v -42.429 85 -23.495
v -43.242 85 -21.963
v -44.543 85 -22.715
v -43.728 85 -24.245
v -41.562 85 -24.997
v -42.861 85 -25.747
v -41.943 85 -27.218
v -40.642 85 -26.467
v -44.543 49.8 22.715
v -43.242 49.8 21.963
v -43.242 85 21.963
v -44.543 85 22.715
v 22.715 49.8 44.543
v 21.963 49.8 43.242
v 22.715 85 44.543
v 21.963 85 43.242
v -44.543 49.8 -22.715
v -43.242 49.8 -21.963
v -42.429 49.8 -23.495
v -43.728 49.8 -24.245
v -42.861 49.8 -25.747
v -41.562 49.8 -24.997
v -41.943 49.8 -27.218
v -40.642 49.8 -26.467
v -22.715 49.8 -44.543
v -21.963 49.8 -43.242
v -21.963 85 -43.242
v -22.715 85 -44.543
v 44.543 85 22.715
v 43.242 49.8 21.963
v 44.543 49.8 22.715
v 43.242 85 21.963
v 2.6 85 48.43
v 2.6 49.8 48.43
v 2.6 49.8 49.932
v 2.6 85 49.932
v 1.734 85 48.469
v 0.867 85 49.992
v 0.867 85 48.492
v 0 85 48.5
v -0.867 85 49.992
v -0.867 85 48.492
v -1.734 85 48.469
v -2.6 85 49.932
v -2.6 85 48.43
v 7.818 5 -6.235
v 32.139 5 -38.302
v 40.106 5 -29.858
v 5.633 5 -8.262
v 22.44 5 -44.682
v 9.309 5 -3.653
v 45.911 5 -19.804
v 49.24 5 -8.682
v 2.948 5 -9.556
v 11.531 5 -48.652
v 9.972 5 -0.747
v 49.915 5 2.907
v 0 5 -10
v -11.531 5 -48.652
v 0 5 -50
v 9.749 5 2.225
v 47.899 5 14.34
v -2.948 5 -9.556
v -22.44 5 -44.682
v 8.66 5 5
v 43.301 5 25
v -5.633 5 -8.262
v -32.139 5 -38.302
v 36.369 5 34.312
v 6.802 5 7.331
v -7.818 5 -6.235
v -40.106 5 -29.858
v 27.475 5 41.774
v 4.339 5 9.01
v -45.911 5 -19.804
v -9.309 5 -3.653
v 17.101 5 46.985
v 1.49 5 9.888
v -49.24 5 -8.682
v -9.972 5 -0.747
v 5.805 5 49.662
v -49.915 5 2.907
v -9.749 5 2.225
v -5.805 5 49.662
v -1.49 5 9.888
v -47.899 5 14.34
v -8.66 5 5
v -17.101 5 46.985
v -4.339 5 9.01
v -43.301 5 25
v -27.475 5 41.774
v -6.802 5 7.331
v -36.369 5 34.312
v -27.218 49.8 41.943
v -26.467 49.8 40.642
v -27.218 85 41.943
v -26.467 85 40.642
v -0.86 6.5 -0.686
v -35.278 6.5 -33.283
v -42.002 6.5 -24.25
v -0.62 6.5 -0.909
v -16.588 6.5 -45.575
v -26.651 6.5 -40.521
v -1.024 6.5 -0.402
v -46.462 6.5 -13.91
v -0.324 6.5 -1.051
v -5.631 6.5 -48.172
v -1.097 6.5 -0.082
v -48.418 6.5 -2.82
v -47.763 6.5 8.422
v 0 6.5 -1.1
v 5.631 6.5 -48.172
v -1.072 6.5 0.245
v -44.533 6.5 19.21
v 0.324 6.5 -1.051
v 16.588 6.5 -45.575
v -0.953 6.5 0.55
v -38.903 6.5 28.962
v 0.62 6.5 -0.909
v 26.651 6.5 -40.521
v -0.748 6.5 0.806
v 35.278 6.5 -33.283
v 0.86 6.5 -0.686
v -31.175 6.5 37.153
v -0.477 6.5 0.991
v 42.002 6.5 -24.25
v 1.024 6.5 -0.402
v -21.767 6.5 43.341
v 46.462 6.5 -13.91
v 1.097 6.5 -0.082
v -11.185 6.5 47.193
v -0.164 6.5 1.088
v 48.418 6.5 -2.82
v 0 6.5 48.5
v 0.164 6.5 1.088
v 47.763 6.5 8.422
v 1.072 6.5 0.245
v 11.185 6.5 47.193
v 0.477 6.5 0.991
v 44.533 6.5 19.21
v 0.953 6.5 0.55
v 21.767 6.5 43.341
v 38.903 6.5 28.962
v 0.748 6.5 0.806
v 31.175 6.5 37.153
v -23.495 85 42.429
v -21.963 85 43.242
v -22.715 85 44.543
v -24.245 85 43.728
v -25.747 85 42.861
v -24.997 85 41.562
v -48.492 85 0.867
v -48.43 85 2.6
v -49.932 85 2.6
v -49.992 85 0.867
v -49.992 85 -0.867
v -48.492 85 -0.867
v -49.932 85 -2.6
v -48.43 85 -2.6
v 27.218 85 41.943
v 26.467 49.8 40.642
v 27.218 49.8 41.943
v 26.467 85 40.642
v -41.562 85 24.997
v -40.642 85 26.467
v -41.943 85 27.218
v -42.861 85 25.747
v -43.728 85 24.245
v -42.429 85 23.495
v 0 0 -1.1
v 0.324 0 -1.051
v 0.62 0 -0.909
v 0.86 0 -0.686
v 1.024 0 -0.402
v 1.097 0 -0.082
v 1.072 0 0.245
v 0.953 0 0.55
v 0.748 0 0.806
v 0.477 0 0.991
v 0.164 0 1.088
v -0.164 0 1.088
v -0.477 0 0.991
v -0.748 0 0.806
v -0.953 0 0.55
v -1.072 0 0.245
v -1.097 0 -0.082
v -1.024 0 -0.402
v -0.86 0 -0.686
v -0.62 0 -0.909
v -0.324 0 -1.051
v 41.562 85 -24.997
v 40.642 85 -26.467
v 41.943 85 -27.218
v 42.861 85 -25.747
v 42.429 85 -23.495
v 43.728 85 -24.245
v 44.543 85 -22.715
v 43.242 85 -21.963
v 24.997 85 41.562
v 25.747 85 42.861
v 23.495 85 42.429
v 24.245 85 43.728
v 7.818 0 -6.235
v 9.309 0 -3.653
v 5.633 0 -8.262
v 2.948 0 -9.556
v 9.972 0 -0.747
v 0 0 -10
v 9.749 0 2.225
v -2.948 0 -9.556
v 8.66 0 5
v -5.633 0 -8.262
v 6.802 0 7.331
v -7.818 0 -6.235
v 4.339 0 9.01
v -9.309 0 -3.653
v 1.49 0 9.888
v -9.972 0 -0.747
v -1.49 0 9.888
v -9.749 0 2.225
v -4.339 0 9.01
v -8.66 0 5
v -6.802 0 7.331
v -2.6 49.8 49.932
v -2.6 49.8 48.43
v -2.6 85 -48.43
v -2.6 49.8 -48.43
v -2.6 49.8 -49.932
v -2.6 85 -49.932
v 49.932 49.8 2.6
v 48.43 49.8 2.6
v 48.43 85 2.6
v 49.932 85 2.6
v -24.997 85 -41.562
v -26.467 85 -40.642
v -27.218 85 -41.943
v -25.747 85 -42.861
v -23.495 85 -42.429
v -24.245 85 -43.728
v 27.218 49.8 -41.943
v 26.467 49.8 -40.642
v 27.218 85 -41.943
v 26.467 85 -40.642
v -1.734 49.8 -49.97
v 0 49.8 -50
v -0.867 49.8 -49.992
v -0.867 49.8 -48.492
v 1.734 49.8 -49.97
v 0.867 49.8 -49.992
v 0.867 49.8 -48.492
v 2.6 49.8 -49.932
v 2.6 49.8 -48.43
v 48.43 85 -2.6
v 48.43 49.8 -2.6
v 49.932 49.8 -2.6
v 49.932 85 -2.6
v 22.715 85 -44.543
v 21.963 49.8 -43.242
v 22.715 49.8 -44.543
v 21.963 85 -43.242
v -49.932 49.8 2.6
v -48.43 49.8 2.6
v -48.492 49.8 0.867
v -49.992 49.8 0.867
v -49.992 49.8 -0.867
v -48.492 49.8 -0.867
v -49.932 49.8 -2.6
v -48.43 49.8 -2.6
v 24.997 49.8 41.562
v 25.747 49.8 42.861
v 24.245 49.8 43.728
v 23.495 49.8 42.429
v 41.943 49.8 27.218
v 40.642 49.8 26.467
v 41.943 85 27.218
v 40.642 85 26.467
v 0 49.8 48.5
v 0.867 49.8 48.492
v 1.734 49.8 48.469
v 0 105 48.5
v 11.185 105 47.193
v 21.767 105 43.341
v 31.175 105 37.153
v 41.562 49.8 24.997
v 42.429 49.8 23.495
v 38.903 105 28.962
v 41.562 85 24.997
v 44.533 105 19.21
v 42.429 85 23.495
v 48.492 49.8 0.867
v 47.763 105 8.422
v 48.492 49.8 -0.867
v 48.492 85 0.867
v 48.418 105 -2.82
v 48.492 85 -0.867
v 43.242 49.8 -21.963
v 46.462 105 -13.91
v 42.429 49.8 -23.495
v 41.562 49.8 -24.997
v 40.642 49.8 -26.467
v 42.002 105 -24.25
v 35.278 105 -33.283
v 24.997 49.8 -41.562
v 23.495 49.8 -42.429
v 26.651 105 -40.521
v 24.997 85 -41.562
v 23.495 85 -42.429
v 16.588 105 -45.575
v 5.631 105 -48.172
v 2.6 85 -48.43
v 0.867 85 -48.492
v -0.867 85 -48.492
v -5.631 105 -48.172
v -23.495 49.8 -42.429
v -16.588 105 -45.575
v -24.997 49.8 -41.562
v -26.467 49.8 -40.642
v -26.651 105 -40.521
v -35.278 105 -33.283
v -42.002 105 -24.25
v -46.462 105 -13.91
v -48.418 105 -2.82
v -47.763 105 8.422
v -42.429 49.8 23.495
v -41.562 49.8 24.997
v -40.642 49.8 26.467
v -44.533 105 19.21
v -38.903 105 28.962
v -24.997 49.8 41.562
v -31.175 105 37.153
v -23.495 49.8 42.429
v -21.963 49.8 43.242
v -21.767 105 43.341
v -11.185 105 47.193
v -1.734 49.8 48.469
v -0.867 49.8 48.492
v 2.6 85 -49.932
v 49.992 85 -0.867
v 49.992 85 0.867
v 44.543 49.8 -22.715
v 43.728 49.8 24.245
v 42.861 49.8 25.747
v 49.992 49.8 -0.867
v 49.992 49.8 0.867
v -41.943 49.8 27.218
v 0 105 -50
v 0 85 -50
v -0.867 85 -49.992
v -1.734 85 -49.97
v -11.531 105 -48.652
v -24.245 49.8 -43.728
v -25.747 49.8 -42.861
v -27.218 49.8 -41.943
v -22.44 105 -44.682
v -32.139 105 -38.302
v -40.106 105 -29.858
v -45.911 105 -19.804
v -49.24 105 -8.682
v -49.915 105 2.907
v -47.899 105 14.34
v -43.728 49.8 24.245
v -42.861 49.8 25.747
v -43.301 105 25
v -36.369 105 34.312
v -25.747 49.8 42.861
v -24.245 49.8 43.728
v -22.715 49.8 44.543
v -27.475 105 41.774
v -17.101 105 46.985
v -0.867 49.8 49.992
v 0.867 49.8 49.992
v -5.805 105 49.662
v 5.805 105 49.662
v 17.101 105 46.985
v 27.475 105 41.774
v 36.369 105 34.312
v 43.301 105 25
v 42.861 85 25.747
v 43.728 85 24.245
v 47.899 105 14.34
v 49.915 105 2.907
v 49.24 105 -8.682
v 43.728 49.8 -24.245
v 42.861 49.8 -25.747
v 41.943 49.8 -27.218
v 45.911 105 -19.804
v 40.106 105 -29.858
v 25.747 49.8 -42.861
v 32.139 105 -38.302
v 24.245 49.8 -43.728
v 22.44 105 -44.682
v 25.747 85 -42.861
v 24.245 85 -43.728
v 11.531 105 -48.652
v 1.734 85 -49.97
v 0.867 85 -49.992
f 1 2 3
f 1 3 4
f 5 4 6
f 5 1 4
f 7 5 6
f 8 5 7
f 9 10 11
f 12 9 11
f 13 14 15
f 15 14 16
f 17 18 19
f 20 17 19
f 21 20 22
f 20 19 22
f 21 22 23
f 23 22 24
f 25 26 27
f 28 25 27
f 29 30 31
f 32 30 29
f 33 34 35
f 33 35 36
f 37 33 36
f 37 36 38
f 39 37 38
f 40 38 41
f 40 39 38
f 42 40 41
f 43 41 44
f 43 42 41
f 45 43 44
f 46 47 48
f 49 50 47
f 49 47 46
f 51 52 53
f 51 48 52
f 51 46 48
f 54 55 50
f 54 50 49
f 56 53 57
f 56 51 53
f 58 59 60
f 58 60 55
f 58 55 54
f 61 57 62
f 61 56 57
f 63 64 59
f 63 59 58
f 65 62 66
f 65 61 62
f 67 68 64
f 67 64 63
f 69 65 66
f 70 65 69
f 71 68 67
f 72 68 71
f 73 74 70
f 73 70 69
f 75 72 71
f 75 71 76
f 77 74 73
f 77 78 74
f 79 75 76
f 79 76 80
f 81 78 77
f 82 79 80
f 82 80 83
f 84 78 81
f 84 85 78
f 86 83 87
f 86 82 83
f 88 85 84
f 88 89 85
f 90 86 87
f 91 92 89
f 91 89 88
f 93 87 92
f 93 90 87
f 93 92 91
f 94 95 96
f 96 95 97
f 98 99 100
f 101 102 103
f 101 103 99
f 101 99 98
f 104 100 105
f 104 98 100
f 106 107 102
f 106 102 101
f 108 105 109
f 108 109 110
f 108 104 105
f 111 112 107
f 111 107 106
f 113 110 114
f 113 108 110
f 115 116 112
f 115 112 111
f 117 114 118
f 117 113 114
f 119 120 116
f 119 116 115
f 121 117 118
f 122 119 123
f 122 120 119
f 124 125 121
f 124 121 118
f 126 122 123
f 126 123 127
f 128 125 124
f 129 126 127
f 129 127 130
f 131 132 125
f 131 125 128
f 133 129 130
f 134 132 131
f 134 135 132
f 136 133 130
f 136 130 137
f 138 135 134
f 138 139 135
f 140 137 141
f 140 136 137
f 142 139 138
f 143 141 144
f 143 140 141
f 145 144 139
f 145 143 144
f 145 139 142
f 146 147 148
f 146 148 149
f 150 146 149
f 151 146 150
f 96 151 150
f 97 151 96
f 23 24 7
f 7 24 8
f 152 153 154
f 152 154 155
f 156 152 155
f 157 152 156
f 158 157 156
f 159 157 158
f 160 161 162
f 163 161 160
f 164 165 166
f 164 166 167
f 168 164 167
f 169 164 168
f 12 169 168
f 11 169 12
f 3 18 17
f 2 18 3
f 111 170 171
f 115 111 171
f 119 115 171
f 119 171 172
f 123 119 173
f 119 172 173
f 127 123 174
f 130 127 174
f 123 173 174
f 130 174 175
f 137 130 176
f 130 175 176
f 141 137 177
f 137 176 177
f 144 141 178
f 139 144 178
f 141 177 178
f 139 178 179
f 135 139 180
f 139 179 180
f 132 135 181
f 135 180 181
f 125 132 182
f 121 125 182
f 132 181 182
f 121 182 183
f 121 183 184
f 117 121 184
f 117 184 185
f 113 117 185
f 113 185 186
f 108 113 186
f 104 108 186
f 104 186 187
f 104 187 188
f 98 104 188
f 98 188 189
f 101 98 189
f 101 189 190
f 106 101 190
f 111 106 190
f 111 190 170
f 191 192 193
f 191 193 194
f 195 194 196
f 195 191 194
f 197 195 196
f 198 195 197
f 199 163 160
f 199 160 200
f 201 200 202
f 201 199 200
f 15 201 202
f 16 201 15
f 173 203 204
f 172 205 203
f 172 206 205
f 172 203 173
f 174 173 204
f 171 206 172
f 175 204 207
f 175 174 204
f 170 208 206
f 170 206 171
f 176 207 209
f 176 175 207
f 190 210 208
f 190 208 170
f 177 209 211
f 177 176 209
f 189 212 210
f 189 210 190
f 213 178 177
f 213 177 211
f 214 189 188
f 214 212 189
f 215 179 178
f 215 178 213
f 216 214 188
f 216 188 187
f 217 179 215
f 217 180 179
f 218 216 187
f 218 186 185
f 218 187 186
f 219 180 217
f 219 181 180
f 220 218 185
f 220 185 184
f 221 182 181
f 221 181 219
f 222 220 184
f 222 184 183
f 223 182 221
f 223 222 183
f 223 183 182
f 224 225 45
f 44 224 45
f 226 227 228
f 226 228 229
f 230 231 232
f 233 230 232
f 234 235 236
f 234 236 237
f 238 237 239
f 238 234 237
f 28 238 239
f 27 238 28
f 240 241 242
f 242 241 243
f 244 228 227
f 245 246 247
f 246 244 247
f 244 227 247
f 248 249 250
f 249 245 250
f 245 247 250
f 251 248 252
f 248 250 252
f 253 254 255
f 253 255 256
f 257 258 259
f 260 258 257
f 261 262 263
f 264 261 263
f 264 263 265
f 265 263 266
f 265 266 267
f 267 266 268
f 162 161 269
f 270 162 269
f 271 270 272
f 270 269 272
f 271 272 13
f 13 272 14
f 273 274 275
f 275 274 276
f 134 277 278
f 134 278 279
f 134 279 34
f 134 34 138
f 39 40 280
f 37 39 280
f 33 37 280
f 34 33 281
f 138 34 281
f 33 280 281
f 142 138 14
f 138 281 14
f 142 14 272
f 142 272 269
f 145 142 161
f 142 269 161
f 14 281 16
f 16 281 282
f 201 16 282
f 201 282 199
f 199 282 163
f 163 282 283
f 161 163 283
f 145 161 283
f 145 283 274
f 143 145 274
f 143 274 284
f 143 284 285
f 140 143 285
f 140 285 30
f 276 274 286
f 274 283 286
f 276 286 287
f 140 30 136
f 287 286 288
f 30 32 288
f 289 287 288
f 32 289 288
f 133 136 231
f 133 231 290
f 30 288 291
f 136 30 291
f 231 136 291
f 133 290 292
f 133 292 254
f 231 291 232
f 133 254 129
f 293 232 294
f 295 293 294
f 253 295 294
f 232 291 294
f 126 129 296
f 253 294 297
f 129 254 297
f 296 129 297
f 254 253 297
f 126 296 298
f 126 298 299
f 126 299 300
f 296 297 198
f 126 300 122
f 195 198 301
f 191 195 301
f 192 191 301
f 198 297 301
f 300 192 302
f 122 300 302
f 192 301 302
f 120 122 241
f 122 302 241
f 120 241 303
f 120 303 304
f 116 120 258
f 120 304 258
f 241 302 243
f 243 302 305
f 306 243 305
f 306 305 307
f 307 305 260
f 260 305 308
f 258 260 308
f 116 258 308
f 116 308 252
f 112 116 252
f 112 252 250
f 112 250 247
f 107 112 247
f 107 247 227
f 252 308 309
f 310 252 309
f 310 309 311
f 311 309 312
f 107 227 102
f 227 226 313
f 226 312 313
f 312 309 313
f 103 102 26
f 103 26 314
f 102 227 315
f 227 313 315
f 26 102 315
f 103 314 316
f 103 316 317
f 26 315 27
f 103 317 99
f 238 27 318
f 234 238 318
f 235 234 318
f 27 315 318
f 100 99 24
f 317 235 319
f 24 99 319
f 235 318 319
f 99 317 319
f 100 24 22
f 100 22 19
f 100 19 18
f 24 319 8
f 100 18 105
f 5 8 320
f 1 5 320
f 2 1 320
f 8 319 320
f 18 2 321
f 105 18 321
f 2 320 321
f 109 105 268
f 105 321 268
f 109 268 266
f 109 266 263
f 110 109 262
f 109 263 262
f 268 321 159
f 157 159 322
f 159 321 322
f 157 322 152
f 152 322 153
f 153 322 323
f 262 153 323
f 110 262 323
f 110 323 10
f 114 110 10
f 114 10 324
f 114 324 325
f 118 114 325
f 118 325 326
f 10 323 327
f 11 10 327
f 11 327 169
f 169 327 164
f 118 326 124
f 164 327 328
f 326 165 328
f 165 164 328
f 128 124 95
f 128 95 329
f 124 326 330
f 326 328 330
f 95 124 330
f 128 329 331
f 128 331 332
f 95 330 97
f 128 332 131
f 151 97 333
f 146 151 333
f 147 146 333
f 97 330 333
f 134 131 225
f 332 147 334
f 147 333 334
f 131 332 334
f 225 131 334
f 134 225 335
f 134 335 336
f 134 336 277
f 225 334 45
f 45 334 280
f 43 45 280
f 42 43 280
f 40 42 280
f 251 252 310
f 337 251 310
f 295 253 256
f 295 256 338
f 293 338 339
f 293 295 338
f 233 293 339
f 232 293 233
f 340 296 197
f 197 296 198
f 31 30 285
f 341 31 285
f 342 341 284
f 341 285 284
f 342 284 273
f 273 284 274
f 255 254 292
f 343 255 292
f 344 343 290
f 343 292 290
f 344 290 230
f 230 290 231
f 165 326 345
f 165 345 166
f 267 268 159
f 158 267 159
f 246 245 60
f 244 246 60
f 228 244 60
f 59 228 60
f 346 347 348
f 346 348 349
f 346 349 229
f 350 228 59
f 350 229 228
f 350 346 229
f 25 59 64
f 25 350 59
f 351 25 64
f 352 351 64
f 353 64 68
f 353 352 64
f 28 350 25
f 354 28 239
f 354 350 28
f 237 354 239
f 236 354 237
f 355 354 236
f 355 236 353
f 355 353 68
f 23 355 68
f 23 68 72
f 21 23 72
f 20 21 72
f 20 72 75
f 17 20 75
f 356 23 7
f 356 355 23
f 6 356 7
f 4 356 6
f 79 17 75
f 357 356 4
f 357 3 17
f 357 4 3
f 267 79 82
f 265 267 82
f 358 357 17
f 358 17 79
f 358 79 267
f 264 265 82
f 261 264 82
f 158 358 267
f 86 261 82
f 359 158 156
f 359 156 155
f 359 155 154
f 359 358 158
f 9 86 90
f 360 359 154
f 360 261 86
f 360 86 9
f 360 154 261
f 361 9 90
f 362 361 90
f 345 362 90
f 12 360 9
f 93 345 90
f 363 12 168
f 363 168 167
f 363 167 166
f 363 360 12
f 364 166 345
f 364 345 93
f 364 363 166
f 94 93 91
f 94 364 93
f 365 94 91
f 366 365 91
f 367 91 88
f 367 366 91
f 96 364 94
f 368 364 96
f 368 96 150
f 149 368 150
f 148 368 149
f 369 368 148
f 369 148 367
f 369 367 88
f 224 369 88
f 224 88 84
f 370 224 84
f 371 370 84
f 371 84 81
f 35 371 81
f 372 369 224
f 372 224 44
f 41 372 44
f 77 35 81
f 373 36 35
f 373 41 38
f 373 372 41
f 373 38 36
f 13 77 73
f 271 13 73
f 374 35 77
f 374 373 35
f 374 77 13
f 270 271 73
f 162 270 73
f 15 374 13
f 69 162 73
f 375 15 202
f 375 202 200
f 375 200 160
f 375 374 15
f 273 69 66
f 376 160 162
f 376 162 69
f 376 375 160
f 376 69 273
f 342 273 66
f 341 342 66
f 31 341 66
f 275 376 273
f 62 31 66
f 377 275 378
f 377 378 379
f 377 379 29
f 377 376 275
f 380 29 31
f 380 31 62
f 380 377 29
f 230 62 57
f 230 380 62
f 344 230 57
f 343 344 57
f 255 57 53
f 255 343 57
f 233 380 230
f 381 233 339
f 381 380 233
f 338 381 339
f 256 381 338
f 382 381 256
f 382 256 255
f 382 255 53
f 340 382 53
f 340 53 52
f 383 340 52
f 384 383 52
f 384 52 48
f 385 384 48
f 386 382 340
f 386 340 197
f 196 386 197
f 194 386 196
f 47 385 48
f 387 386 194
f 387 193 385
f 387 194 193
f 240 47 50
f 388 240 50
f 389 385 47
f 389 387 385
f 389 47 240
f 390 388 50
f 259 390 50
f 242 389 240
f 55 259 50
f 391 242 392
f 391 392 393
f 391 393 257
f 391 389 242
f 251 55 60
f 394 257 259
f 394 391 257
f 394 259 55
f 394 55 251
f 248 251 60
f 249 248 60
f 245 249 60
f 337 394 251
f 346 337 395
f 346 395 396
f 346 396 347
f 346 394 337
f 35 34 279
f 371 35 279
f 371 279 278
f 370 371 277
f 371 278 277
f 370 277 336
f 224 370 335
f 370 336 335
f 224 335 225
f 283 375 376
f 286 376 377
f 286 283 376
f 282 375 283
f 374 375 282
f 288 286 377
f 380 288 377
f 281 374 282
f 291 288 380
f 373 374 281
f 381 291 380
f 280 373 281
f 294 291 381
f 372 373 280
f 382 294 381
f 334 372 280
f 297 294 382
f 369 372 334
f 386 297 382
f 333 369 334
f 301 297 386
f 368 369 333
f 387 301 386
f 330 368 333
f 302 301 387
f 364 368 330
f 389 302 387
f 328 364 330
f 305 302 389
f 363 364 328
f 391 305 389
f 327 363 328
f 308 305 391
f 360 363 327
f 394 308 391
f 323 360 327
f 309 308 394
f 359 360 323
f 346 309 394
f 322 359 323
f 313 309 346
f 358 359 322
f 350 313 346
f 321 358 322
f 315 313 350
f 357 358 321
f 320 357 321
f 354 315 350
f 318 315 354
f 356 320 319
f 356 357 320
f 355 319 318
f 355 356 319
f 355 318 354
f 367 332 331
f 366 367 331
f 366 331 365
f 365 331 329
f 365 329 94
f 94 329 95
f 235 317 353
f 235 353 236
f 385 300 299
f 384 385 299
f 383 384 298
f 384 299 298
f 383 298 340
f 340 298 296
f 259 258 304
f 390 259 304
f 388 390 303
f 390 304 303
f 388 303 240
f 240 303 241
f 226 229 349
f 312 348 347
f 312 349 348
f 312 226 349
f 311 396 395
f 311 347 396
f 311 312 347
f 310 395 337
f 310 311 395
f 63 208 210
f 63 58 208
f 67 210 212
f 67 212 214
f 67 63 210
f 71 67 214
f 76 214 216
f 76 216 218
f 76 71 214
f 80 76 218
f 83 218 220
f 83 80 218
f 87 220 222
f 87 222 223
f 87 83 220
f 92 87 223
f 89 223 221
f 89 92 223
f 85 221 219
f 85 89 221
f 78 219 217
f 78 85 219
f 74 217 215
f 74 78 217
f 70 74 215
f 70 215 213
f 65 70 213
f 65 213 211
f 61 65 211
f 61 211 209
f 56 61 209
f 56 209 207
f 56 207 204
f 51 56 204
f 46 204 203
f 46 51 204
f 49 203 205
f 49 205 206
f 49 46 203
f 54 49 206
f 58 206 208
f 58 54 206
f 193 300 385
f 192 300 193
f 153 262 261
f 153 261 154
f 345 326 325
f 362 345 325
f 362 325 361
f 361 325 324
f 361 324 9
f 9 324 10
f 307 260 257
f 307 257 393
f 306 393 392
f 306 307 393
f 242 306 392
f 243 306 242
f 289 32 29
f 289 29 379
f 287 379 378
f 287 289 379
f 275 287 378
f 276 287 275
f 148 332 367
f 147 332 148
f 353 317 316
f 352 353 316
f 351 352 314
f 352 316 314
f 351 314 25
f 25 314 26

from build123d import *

# Parameters (mm, degrees)
CROQUIS3_R            = 48.5
CORTAR_EXTRUIR1_DEPTH = 98.5
CROQUIS4_R            = 1.1
CORTAR_EXTRUIR2_DEPTH = 98.5
CROQUIS6_W            = 5.2
CROQUIS6_H            = 35.2
CORTAR_EXTRUIR3_DEPTH = 98.5
MATRIZC1_COUNT        = 12


with BuildPart() as part:
    # Croquis2 → Revolución2 (revolve)
    with BuildSketch(Plane.XY, mode=Mode.PRIVATE) as revoluci_n2_sk:
        Polygon((0, 0), (-10, 0), (-10, 5), (-50, 5), (-50, 105), (0, 105), align=None)
    revolve(revoluci_n2_sk.sketch.rotate(Axis((0, 0, 0), (0, 1, 0)), 270), axis=Axis((0, 0, 0), (0, 1, 0)))

    # Croquis3 → Cortar-Extruir1 (cut)
    with BuildSketch(Plane(origin=(0, 105, 0), x_dir=(1, 0, 0), z_dir=(0, 1, 0))):
        with Locations(Location((0, 0, 0), (0, 0, 270))):
            Circle(CROQUIS3_R)
    extrude(amount=-CORTAR_EXTRUIR1_DEPTH, mode=Mode.SUBTRACT)

    # Croquis4 → Cortar-Extruir2 (cut)
    with BuildSketch(Plane.XZ):
        with Locations(Location((0, 0, 0), (0, 0, 270))):
            Circle(CROQUIS4_R)
    extrude(amount=-CORTAR_EXTRUIR2_DEPTH, mode=Mode.SUBTRACT)

    # Croquis6 → Cortar-Extruir3 (cut)
    with BuildSketch(Plane.XY):
        with Locations((0, 67.4)):
            Rectangle(CROQUIS6_W, CROQUIS6_H)
    cortar_extruir3 = extrude(amount=-CORTAR_EXTRUIR3_DEPTH, mode=Mode.SUBTRACT)

    # MatrizC1: Cortar-Extruir3 ×12 about axis
    matrizc1_axis = Axis((0, 0, 0), (0, 1, 0))
    for i in range(1, MATRIZC1_COUNT):
        add(cortar_extruir3.rotate(matrizc1_axis, i * 360 / MATRIZC1_COUNT), mode=Mode.SUBTRACT)


solid = part.part
